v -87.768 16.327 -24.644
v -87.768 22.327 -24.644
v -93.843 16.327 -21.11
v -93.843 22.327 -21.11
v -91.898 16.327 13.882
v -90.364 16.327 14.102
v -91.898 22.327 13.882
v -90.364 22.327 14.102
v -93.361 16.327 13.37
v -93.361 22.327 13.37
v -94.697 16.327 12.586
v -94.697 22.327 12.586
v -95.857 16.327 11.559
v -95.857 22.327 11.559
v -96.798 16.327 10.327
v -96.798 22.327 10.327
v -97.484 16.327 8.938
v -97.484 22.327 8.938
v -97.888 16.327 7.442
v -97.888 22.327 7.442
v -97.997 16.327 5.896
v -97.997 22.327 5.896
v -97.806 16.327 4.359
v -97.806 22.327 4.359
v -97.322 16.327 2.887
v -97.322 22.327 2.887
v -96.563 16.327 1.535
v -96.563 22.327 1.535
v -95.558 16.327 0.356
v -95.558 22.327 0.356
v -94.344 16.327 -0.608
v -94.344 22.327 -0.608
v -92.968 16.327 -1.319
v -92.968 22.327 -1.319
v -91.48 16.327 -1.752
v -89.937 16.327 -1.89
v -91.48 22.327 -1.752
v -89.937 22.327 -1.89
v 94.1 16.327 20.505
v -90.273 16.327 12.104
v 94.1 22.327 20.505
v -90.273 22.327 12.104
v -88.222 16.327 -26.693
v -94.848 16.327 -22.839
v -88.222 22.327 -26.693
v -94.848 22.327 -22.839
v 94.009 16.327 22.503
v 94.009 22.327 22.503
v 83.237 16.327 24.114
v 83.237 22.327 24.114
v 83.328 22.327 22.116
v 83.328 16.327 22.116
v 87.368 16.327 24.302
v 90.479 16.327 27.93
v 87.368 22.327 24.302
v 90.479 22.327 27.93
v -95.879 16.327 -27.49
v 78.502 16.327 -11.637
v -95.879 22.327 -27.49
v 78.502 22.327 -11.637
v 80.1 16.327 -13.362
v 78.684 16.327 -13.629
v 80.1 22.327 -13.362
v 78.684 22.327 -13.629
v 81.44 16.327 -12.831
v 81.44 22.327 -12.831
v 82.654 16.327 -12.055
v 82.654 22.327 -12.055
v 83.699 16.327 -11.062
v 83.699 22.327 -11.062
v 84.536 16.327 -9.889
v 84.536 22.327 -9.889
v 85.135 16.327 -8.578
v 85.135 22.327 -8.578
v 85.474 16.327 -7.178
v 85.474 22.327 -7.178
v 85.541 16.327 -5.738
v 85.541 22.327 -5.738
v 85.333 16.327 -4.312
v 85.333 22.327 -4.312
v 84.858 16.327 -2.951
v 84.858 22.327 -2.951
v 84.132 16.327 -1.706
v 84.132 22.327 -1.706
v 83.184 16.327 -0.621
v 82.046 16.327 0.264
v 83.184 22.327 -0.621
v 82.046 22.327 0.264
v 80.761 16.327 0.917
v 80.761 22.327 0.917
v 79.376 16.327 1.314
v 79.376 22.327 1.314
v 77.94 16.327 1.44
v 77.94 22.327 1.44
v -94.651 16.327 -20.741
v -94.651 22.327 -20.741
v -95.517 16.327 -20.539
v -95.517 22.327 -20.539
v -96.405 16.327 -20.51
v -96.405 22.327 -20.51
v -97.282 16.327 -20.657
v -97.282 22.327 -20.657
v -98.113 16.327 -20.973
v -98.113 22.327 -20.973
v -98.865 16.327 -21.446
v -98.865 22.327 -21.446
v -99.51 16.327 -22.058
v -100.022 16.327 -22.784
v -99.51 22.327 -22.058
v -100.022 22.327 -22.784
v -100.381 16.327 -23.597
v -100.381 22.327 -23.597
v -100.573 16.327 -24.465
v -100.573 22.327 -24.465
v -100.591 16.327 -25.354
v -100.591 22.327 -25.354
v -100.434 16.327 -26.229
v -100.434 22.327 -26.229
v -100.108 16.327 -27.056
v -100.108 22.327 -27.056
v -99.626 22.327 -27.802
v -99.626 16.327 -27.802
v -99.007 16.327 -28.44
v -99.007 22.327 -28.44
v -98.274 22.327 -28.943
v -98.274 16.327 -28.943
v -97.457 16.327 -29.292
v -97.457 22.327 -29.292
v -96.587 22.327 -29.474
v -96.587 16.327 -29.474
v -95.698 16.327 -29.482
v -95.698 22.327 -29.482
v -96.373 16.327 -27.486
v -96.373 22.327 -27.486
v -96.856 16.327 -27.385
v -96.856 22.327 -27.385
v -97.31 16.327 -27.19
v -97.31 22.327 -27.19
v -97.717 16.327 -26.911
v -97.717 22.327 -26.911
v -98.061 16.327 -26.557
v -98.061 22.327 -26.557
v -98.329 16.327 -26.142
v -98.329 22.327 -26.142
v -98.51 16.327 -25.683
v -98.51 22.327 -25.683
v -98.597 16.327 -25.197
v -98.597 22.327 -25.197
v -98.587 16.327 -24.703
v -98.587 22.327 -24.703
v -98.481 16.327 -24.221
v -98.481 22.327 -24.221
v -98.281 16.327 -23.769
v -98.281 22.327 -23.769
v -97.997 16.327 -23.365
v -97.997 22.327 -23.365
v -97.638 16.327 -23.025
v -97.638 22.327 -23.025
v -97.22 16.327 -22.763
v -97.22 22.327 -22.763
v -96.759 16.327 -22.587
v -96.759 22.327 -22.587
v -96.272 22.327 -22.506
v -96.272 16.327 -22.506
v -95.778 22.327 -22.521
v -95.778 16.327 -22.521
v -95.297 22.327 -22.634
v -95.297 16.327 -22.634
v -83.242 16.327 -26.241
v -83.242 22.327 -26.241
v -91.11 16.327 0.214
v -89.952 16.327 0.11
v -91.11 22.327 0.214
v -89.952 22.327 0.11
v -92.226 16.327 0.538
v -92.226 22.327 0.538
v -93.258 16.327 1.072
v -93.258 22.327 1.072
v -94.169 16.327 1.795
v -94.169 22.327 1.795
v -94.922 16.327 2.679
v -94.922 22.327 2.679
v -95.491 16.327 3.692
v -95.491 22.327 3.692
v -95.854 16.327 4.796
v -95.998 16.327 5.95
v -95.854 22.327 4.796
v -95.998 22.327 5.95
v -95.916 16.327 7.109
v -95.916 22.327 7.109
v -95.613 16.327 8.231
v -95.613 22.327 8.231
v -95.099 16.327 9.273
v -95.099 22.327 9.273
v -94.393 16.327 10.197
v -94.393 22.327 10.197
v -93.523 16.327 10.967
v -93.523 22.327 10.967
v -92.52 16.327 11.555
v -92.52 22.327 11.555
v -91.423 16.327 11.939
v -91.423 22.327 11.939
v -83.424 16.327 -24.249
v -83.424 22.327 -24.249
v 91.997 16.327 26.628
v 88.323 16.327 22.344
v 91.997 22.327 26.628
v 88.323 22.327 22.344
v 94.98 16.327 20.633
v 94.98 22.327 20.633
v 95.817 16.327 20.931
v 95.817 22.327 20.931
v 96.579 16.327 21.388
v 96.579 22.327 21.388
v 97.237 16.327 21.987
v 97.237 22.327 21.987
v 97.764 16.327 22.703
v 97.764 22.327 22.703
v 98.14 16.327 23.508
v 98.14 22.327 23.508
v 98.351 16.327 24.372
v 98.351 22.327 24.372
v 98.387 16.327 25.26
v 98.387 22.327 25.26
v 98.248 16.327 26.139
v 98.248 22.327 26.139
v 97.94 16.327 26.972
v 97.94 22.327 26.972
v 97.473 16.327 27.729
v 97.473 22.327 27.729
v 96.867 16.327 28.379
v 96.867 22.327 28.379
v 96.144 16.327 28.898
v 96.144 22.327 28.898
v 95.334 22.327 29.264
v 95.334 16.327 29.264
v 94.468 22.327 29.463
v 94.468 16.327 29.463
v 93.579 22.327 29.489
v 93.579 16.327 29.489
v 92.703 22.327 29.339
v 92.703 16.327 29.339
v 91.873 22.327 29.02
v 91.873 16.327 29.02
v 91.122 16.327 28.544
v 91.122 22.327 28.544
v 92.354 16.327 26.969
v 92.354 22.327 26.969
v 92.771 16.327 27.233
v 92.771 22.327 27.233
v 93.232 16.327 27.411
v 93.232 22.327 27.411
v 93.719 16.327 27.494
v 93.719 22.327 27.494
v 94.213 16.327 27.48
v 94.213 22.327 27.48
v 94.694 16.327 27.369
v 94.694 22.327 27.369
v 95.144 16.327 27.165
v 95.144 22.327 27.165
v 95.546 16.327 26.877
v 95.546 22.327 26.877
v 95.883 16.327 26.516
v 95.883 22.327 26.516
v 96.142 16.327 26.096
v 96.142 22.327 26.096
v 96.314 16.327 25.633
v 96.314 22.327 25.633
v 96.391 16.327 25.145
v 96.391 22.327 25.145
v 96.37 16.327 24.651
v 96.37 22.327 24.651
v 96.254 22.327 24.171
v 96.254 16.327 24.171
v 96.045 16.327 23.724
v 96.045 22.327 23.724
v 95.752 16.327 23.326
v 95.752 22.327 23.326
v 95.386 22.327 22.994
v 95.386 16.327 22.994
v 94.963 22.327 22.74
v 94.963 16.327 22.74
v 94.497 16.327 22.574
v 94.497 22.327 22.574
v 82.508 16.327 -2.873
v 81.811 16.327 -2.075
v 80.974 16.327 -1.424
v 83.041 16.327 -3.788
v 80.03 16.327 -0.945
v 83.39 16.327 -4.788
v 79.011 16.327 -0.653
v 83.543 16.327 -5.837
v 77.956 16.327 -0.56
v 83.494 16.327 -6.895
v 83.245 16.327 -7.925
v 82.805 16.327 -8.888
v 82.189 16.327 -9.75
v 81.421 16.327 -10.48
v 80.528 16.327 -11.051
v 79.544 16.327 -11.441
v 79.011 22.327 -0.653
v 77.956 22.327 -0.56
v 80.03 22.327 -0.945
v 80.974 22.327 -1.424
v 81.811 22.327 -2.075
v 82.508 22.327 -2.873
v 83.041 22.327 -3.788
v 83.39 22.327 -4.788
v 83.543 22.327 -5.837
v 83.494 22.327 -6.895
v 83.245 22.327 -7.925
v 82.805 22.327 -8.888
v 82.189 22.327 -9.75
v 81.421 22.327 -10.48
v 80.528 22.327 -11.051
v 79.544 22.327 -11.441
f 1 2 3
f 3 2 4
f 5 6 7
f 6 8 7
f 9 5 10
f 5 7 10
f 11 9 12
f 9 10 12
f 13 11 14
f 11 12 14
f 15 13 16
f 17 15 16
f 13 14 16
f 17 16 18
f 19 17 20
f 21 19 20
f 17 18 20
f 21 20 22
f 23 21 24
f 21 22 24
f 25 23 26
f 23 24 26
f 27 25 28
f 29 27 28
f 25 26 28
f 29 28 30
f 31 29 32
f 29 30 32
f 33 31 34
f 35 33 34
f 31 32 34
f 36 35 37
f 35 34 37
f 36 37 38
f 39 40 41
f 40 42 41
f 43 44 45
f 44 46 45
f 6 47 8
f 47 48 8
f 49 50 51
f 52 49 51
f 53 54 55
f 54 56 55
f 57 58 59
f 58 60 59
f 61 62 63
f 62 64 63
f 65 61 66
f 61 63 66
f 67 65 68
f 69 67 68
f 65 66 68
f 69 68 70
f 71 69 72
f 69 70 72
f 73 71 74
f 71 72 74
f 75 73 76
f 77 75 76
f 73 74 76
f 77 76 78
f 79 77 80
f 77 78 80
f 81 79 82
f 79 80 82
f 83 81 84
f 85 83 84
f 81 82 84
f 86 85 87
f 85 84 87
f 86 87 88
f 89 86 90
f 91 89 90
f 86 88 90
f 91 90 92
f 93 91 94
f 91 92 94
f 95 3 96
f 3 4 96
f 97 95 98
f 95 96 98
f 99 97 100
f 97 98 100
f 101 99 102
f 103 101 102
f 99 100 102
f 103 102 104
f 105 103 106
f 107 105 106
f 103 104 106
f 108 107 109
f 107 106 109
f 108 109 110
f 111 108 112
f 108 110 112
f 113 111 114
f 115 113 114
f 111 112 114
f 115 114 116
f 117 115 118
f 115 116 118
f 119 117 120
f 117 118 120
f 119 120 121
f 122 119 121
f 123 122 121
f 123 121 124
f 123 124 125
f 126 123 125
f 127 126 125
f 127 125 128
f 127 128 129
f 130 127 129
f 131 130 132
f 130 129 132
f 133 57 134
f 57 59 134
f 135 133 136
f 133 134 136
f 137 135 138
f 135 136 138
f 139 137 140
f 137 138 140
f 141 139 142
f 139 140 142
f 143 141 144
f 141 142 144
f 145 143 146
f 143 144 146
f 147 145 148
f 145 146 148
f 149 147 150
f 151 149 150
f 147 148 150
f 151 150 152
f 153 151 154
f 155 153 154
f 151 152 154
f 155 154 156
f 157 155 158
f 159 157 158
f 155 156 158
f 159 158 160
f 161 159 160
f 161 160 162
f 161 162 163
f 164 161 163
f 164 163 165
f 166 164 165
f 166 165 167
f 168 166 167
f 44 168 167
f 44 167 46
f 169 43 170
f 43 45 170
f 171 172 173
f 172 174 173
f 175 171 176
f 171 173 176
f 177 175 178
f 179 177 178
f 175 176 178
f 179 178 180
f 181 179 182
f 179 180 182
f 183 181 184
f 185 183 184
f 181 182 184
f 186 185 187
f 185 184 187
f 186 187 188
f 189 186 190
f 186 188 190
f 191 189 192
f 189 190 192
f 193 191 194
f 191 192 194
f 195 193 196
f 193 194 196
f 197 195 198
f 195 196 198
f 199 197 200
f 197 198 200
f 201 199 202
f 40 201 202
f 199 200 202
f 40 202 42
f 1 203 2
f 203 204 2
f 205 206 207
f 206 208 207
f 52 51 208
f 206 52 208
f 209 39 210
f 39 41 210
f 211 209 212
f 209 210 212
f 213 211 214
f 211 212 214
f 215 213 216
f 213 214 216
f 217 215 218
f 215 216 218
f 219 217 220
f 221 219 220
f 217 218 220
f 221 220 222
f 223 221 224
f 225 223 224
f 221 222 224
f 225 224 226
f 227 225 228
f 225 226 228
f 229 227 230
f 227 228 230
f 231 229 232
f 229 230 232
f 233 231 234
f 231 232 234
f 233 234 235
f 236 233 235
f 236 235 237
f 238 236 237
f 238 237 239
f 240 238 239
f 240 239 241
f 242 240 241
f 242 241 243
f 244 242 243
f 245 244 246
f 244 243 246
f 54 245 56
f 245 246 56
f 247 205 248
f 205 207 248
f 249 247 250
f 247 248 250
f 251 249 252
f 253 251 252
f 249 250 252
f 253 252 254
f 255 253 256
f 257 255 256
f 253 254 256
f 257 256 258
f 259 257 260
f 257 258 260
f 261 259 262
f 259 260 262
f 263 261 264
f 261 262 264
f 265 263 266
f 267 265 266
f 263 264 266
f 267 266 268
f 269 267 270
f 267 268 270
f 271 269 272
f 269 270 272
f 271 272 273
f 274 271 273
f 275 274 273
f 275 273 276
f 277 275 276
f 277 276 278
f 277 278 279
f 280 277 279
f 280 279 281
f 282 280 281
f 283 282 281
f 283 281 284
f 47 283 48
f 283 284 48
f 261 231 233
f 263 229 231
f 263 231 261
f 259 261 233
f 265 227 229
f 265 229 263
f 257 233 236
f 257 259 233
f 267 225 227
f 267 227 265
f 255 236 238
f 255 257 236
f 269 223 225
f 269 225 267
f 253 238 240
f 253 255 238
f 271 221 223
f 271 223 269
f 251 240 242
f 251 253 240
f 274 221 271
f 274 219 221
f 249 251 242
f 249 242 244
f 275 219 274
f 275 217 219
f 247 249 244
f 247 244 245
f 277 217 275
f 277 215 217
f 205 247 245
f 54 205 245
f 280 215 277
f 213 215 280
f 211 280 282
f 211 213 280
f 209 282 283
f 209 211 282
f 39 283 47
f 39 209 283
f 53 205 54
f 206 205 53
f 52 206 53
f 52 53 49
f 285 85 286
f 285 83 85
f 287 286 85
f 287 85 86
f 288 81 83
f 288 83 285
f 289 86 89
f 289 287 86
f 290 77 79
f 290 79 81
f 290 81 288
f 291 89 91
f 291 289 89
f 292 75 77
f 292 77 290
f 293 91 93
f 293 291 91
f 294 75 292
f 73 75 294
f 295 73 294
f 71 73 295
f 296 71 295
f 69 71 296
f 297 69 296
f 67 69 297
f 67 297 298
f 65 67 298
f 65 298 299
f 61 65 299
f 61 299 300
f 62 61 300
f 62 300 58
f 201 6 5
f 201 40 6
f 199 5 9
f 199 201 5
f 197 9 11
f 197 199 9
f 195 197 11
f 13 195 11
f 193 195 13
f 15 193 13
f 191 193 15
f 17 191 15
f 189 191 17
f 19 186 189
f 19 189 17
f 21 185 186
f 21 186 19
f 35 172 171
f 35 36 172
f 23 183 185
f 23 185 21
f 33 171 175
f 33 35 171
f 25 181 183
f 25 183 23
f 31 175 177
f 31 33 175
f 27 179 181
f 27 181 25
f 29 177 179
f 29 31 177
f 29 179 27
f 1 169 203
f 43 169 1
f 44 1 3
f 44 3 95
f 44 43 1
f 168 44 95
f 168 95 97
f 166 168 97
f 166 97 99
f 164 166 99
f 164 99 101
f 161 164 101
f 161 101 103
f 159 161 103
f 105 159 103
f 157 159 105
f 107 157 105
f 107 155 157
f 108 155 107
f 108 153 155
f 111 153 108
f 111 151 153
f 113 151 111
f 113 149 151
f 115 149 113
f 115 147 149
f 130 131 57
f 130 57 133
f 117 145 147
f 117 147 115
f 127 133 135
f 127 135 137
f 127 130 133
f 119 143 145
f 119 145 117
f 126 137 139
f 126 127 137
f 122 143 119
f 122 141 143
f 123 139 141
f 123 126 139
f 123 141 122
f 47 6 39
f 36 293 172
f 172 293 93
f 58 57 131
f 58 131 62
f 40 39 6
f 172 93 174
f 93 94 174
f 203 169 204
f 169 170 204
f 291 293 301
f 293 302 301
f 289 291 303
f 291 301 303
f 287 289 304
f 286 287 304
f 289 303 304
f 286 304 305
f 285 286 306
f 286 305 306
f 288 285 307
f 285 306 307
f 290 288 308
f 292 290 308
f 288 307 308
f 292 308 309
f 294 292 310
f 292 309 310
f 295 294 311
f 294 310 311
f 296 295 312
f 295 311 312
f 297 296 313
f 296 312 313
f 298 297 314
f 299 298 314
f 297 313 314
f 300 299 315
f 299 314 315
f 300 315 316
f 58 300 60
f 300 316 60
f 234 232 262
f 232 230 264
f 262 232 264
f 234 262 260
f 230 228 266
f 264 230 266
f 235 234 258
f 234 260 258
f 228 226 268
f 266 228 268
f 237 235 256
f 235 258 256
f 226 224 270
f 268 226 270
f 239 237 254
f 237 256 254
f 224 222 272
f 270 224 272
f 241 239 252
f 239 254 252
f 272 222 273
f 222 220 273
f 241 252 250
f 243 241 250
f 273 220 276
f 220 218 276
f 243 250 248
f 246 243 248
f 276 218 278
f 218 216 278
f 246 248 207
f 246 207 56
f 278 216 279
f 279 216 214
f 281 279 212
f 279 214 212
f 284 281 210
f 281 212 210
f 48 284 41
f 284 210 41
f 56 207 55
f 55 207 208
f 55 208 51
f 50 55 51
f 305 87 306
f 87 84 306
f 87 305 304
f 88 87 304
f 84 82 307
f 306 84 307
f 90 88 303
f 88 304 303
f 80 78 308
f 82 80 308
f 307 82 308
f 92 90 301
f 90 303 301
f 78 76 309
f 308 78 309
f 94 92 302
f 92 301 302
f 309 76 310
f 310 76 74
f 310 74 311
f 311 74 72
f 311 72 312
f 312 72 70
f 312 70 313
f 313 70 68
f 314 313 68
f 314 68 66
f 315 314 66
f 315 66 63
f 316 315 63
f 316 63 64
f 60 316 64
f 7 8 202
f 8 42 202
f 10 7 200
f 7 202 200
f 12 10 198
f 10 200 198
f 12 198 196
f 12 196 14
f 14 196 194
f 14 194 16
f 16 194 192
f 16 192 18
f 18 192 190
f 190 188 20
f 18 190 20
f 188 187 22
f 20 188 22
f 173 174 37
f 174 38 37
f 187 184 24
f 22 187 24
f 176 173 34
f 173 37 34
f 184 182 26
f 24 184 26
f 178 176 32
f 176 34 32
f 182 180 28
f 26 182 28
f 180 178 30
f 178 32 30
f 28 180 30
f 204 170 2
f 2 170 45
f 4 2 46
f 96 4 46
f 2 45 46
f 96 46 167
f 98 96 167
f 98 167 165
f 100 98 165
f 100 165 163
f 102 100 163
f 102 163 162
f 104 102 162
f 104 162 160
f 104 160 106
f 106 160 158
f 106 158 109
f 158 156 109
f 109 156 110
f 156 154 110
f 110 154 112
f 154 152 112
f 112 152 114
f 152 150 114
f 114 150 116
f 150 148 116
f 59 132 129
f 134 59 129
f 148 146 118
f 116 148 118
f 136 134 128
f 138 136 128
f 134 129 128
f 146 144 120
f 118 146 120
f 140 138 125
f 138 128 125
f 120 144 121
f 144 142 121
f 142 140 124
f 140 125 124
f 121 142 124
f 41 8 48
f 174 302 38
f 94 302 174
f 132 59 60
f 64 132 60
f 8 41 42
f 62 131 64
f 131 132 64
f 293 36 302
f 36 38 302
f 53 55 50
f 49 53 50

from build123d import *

# Parameters (mm, degrees)
EXTRUDE_THIN1_DEPTH = 3


with BuildPart() as part:
    # Sketch2 → Extrude-Thin1 (new, symmetric)
    with BuildSketch(Plane(origin=(0, 19.326776695, 0), x_dir=(1, 0, 0), z_dir=(0, 1, 0))):
        with BuildLine():
            Line((83.328079119, -22.116037785), (88.322896843, -22.343624921))
            Line((88.322896843, -22.343624921), (91.997250324, -26.627587507))
            ThreePointArc((91.997250324, -26.627587507), (96.141958225, -26.095715612), (94.008663166, -22.502591138))
            Line((94.008663166, -22.502591138), (-90.364139419, -14.101708358))
            ThreePointArc((-90.364139419, -14.101708358), (-97.997143033, -5.896216694), (-89.936648421, 1.889749157))
            Line((-89.936648421, 1.889749157), (77.956049842, 0.560174022))
            ThreePointArc((77.956049842, 0.560174022), (83.543259885, 5.836559245), (78.502463441, 11.6372082))
            Line((78.502463441, 11.6372082), (-95.878795519, 27.489733424))
            ThreePointArc((-95.878795519, 27.489733424), (-98.545913109, 24.45909356), (-94.848135548, 22.838990066))
            Line((-94.848135548, 22.838990066), (-88.221929105, 26.693256199))
            Line((-88.221929105, 26.693256199), (-83.242462258, 26.240586433))
            Line((-83.242462258, 26.240586433), (-83.423530164, 24.248799694))
            Line((-83.423530164, 24.248799694), (-87.767727276, 24.643718819))
            Line((-87.767727276, 24.643718819), (-93.842539664, 21.110182118))
            ThreePointArc((-93.842539664, 21.110182118), (-100.498539275, 24.026368407), (-95.697727612, 29.481520162))
            Line((-95.697727612, 29.481520162), (78.683531348, 13.628994939))
            ThreePointArc((78.683531348, 13.628994939), (85.540831015, 5.738022037), (77.940211947, -1.439763267))
            Line((77.940211947, -1.439763267), (-89.952486316, -0.110188132))
            ThreePointArc((-89.952486316, -0.110188132), (-95.997857275, -5.949662521), (-90.273104564, -12.103781269))
            Line((-90.273104564, -12.103781269), (94.099698021, -20.504664048))
            ThreePointArc((94.099698021, -20.504664048), (97.939629126, -26.972288102), (90.479154905, -27.929657512))
            Line((90.479154905, -27.929657512), (87.367872452, -24.302184627))
            Line((87.367872452, -24.302184627), (83.237044264, -24.113964874))
            Line((83.237044264, -24.113964874), (83.328079119, -22.116037785))
        make_face()
    extrude(amount=EXTRUDE_THIN1_DEPTH, both=True)


solid = part.part
